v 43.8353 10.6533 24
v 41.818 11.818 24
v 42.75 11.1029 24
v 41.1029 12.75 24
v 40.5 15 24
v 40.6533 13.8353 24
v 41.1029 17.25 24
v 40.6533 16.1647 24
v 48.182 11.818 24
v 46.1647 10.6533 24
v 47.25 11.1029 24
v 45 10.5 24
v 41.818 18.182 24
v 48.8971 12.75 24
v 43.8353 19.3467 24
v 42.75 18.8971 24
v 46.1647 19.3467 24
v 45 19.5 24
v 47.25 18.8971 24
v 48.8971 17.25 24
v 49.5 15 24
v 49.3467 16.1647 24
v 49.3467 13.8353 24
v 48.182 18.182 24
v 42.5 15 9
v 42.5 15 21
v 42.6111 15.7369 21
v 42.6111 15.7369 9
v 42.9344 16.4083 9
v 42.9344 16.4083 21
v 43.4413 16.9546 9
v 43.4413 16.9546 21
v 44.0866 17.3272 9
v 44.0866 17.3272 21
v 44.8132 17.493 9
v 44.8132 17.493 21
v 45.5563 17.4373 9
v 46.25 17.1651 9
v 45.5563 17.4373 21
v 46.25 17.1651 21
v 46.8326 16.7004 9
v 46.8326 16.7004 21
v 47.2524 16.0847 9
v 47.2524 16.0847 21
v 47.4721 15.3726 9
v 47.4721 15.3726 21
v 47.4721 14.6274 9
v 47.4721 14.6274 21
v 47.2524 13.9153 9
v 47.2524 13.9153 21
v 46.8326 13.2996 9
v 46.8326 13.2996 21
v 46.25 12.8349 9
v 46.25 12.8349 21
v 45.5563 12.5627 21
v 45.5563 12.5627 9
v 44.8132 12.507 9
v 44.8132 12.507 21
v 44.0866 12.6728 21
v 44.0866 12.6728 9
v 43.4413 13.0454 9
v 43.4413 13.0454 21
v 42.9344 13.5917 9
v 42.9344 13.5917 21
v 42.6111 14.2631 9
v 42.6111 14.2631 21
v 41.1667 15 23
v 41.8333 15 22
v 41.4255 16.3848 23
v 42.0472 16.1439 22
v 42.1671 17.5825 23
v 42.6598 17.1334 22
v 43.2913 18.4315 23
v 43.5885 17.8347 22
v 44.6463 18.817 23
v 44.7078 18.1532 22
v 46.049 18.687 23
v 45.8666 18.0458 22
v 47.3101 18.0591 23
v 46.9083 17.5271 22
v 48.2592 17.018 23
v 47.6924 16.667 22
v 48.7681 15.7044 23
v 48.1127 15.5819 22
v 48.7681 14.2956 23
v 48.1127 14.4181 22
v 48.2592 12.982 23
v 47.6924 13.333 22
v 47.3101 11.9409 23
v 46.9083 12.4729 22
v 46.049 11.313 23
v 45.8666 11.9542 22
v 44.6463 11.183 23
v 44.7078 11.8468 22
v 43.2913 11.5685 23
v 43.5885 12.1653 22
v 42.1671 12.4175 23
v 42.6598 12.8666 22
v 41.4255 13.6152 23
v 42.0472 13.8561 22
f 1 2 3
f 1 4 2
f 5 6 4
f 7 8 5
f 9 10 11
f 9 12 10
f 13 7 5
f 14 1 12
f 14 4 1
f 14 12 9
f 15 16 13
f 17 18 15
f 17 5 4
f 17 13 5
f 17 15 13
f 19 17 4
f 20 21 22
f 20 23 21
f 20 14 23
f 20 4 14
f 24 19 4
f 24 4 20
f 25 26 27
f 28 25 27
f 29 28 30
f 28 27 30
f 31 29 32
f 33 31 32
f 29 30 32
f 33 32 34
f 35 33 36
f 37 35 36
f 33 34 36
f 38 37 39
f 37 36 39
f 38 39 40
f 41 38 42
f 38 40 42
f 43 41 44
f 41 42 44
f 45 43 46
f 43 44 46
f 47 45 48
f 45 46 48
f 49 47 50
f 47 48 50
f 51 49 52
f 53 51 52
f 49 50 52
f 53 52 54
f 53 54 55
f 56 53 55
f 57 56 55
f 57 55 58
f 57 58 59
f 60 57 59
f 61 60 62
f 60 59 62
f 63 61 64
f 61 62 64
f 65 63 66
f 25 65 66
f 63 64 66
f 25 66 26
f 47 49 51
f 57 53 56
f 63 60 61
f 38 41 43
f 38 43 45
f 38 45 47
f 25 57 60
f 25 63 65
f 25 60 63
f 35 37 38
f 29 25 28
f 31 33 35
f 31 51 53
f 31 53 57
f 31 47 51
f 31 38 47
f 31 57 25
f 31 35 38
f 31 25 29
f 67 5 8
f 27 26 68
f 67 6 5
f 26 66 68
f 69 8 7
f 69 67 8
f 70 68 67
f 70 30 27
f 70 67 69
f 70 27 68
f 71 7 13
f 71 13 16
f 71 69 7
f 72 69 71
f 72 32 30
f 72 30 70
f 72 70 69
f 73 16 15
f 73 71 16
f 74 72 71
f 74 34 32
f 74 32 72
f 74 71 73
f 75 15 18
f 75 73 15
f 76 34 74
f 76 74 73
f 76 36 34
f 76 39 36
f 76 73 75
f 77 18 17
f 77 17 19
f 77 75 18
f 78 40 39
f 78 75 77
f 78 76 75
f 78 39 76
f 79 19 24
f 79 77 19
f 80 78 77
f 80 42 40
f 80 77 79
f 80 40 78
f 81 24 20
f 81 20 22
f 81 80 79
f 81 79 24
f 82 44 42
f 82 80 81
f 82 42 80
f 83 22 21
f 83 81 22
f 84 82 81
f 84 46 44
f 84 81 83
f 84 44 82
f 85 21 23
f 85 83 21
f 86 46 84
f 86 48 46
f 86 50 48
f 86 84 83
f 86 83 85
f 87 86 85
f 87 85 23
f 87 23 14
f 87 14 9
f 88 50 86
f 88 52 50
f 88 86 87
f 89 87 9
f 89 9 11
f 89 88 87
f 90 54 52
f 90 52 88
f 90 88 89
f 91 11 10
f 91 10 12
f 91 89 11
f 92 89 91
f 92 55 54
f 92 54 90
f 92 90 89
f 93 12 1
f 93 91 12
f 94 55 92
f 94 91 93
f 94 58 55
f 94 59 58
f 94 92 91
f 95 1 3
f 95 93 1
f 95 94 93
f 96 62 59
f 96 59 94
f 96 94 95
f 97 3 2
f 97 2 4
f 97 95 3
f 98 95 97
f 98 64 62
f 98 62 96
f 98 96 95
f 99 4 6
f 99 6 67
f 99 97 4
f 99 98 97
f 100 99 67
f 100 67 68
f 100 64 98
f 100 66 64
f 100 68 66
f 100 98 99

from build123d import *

# Parameters (mm, degrees)
CYLINDER010_R                = 2.5
CYLINDER010_DEPTH            = 12
FUSION001018_PLACEMENT_ANGLE = 180


with BuildPart() as cone002:
    # Cone002 → Cone002 (revolve)
    with BuildSketch(Plane(origin=(0, 0, -3), x_dir=(1, 0, 0), z_dir=(0, -1, 0))):
        Polygon((0, 0), (4.5, 0), (2.5, 3), (0, 3), align=None)
    revolve(axis=Axis((0, 0, -3), (0, 0, 1)))


with BuildPart() as m5x12_senkkopf:
    # Cylinder010 → Cylinder010 (new body)
    with BuildSketch(Plane.XY):
        Circle(CYLINDER010_R)
    extrude(amount=CYLINDER010_DEPTH)

    # Fusion001018: union Cone002
    add(cone002.part)


with BuildPart() as m5x12_senkkopf_1:
    # Fusion001018 placement: moved
    add(m5x12_senkkopf.part.moved(Location((45, 15, 21))).rotate(Axis((45, 15, 21), (0, 1, 0)), FUSION001018_PLACEMENT_ANGLE))


solid = m5x12_senkkopf_1.part
